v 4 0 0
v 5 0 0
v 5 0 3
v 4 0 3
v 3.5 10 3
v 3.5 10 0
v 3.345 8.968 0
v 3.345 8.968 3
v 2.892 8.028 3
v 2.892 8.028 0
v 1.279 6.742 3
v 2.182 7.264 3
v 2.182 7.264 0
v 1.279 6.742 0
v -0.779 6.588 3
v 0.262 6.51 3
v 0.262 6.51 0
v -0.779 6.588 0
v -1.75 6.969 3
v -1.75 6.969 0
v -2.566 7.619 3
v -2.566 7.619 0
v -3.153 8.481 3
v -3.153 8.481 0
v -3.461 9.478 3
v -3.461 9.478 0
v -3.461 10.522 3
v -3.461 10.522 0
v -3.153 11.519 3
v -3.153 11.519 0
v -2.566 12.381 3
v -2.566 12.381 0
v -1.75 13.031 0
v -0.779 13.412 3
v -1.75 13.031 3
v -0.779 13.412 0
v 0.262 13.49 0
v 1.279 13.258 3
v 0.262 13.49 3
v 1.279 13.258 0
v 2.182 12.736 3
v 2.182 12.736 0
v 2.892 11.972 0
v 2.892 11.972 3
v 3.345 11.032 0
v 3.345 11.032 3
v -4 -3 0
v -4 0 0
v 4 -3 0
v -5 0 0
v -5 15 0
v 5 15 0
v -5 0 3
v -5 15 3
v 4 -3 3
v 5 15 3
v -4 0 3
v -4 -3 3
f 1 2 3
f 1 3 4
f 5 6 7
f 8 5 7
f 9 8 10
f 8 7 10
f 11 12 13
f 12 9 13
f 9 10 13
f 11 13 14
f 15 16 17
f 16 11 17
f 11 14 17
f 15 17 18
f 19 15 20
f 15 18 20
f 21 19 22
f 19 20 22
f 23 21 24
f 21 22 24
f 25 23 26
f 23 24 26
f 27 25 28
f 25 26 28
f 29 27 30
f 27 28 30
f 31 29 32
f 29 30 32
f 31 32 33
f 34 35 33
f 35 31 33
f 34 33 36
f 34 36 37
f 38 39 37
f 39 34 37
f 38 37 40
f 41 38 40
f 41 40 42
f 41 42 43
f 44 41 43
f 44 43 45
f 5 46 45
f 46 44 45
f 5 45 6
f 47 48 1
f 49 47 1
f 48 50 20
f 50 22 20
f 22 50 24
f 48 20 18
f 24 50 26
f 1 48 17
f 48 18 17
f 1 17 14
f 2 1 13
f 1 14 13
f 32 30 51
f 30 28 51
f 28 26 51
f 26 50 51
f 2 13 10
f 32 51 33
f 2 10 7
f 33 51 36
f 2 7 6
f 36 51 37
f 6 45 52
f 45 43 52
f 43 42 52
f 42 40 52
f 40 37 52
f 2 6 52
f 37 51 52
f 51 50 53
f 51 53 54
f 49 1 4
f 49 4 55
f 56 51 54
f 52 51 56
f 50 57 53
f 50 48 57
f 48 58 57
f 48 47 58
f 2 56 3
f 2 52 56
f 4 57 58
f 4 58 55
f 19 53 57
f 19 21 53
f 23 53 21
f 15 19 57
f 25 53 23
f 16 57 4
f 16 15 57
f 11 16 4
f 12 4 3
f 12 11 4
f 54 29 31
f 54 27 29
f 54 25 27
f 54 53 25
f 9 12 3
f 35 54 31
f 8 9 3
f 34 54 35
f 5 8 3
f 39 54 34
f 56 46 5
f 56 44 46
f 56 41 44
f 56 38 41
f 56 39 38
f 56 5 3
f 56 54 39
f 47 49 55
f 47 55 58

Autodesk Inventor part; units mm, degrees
ref_plane "YZ Plane" through (0, 0, 0) normal (1, 0, 0) x (0, 1, 0)
ref_plane "XZ Plane" through (0, 0, 0) normal (0, 1, 0) x (-1, 0, 0)
ref_plane "XY Plane" through (0, 0, 0) normal (0, 0, 1) x (1, 0, 0)
sketch "草圖1" plane through (0, 0, 0) normal (0, 0, 1) x (1, 0, 0)
  line L0 (-5, 15) -> (5, 15)
  line L1 (5, 15) -> (5, 0)
  line L2 (5, 0) -> (-5, 0)
  line L3 (-5, 0) -> (-5, 15)
  line L4 (-4, 0) -> (4, 0)
  line L5 (4, 0) -> (4, -3)
  line L6 (4, -3) -> (-4, -3)
  line L7 (-4, -3) -> (-4, 0)
  circle A0 centre (0, 10) radius 3.5
  point P0 (0, 0)
  point P1 (0, 0)
  dimension "d0" = 3
  dimension "d1" = 8
  dimension "d2" = 15
  dimension "d3" = 7
  dimension "d4" = 5
  dimension "d5" = 10
extrude "擠出1" add sketch "草圖1" along normal blind 3
properties part number "land"
